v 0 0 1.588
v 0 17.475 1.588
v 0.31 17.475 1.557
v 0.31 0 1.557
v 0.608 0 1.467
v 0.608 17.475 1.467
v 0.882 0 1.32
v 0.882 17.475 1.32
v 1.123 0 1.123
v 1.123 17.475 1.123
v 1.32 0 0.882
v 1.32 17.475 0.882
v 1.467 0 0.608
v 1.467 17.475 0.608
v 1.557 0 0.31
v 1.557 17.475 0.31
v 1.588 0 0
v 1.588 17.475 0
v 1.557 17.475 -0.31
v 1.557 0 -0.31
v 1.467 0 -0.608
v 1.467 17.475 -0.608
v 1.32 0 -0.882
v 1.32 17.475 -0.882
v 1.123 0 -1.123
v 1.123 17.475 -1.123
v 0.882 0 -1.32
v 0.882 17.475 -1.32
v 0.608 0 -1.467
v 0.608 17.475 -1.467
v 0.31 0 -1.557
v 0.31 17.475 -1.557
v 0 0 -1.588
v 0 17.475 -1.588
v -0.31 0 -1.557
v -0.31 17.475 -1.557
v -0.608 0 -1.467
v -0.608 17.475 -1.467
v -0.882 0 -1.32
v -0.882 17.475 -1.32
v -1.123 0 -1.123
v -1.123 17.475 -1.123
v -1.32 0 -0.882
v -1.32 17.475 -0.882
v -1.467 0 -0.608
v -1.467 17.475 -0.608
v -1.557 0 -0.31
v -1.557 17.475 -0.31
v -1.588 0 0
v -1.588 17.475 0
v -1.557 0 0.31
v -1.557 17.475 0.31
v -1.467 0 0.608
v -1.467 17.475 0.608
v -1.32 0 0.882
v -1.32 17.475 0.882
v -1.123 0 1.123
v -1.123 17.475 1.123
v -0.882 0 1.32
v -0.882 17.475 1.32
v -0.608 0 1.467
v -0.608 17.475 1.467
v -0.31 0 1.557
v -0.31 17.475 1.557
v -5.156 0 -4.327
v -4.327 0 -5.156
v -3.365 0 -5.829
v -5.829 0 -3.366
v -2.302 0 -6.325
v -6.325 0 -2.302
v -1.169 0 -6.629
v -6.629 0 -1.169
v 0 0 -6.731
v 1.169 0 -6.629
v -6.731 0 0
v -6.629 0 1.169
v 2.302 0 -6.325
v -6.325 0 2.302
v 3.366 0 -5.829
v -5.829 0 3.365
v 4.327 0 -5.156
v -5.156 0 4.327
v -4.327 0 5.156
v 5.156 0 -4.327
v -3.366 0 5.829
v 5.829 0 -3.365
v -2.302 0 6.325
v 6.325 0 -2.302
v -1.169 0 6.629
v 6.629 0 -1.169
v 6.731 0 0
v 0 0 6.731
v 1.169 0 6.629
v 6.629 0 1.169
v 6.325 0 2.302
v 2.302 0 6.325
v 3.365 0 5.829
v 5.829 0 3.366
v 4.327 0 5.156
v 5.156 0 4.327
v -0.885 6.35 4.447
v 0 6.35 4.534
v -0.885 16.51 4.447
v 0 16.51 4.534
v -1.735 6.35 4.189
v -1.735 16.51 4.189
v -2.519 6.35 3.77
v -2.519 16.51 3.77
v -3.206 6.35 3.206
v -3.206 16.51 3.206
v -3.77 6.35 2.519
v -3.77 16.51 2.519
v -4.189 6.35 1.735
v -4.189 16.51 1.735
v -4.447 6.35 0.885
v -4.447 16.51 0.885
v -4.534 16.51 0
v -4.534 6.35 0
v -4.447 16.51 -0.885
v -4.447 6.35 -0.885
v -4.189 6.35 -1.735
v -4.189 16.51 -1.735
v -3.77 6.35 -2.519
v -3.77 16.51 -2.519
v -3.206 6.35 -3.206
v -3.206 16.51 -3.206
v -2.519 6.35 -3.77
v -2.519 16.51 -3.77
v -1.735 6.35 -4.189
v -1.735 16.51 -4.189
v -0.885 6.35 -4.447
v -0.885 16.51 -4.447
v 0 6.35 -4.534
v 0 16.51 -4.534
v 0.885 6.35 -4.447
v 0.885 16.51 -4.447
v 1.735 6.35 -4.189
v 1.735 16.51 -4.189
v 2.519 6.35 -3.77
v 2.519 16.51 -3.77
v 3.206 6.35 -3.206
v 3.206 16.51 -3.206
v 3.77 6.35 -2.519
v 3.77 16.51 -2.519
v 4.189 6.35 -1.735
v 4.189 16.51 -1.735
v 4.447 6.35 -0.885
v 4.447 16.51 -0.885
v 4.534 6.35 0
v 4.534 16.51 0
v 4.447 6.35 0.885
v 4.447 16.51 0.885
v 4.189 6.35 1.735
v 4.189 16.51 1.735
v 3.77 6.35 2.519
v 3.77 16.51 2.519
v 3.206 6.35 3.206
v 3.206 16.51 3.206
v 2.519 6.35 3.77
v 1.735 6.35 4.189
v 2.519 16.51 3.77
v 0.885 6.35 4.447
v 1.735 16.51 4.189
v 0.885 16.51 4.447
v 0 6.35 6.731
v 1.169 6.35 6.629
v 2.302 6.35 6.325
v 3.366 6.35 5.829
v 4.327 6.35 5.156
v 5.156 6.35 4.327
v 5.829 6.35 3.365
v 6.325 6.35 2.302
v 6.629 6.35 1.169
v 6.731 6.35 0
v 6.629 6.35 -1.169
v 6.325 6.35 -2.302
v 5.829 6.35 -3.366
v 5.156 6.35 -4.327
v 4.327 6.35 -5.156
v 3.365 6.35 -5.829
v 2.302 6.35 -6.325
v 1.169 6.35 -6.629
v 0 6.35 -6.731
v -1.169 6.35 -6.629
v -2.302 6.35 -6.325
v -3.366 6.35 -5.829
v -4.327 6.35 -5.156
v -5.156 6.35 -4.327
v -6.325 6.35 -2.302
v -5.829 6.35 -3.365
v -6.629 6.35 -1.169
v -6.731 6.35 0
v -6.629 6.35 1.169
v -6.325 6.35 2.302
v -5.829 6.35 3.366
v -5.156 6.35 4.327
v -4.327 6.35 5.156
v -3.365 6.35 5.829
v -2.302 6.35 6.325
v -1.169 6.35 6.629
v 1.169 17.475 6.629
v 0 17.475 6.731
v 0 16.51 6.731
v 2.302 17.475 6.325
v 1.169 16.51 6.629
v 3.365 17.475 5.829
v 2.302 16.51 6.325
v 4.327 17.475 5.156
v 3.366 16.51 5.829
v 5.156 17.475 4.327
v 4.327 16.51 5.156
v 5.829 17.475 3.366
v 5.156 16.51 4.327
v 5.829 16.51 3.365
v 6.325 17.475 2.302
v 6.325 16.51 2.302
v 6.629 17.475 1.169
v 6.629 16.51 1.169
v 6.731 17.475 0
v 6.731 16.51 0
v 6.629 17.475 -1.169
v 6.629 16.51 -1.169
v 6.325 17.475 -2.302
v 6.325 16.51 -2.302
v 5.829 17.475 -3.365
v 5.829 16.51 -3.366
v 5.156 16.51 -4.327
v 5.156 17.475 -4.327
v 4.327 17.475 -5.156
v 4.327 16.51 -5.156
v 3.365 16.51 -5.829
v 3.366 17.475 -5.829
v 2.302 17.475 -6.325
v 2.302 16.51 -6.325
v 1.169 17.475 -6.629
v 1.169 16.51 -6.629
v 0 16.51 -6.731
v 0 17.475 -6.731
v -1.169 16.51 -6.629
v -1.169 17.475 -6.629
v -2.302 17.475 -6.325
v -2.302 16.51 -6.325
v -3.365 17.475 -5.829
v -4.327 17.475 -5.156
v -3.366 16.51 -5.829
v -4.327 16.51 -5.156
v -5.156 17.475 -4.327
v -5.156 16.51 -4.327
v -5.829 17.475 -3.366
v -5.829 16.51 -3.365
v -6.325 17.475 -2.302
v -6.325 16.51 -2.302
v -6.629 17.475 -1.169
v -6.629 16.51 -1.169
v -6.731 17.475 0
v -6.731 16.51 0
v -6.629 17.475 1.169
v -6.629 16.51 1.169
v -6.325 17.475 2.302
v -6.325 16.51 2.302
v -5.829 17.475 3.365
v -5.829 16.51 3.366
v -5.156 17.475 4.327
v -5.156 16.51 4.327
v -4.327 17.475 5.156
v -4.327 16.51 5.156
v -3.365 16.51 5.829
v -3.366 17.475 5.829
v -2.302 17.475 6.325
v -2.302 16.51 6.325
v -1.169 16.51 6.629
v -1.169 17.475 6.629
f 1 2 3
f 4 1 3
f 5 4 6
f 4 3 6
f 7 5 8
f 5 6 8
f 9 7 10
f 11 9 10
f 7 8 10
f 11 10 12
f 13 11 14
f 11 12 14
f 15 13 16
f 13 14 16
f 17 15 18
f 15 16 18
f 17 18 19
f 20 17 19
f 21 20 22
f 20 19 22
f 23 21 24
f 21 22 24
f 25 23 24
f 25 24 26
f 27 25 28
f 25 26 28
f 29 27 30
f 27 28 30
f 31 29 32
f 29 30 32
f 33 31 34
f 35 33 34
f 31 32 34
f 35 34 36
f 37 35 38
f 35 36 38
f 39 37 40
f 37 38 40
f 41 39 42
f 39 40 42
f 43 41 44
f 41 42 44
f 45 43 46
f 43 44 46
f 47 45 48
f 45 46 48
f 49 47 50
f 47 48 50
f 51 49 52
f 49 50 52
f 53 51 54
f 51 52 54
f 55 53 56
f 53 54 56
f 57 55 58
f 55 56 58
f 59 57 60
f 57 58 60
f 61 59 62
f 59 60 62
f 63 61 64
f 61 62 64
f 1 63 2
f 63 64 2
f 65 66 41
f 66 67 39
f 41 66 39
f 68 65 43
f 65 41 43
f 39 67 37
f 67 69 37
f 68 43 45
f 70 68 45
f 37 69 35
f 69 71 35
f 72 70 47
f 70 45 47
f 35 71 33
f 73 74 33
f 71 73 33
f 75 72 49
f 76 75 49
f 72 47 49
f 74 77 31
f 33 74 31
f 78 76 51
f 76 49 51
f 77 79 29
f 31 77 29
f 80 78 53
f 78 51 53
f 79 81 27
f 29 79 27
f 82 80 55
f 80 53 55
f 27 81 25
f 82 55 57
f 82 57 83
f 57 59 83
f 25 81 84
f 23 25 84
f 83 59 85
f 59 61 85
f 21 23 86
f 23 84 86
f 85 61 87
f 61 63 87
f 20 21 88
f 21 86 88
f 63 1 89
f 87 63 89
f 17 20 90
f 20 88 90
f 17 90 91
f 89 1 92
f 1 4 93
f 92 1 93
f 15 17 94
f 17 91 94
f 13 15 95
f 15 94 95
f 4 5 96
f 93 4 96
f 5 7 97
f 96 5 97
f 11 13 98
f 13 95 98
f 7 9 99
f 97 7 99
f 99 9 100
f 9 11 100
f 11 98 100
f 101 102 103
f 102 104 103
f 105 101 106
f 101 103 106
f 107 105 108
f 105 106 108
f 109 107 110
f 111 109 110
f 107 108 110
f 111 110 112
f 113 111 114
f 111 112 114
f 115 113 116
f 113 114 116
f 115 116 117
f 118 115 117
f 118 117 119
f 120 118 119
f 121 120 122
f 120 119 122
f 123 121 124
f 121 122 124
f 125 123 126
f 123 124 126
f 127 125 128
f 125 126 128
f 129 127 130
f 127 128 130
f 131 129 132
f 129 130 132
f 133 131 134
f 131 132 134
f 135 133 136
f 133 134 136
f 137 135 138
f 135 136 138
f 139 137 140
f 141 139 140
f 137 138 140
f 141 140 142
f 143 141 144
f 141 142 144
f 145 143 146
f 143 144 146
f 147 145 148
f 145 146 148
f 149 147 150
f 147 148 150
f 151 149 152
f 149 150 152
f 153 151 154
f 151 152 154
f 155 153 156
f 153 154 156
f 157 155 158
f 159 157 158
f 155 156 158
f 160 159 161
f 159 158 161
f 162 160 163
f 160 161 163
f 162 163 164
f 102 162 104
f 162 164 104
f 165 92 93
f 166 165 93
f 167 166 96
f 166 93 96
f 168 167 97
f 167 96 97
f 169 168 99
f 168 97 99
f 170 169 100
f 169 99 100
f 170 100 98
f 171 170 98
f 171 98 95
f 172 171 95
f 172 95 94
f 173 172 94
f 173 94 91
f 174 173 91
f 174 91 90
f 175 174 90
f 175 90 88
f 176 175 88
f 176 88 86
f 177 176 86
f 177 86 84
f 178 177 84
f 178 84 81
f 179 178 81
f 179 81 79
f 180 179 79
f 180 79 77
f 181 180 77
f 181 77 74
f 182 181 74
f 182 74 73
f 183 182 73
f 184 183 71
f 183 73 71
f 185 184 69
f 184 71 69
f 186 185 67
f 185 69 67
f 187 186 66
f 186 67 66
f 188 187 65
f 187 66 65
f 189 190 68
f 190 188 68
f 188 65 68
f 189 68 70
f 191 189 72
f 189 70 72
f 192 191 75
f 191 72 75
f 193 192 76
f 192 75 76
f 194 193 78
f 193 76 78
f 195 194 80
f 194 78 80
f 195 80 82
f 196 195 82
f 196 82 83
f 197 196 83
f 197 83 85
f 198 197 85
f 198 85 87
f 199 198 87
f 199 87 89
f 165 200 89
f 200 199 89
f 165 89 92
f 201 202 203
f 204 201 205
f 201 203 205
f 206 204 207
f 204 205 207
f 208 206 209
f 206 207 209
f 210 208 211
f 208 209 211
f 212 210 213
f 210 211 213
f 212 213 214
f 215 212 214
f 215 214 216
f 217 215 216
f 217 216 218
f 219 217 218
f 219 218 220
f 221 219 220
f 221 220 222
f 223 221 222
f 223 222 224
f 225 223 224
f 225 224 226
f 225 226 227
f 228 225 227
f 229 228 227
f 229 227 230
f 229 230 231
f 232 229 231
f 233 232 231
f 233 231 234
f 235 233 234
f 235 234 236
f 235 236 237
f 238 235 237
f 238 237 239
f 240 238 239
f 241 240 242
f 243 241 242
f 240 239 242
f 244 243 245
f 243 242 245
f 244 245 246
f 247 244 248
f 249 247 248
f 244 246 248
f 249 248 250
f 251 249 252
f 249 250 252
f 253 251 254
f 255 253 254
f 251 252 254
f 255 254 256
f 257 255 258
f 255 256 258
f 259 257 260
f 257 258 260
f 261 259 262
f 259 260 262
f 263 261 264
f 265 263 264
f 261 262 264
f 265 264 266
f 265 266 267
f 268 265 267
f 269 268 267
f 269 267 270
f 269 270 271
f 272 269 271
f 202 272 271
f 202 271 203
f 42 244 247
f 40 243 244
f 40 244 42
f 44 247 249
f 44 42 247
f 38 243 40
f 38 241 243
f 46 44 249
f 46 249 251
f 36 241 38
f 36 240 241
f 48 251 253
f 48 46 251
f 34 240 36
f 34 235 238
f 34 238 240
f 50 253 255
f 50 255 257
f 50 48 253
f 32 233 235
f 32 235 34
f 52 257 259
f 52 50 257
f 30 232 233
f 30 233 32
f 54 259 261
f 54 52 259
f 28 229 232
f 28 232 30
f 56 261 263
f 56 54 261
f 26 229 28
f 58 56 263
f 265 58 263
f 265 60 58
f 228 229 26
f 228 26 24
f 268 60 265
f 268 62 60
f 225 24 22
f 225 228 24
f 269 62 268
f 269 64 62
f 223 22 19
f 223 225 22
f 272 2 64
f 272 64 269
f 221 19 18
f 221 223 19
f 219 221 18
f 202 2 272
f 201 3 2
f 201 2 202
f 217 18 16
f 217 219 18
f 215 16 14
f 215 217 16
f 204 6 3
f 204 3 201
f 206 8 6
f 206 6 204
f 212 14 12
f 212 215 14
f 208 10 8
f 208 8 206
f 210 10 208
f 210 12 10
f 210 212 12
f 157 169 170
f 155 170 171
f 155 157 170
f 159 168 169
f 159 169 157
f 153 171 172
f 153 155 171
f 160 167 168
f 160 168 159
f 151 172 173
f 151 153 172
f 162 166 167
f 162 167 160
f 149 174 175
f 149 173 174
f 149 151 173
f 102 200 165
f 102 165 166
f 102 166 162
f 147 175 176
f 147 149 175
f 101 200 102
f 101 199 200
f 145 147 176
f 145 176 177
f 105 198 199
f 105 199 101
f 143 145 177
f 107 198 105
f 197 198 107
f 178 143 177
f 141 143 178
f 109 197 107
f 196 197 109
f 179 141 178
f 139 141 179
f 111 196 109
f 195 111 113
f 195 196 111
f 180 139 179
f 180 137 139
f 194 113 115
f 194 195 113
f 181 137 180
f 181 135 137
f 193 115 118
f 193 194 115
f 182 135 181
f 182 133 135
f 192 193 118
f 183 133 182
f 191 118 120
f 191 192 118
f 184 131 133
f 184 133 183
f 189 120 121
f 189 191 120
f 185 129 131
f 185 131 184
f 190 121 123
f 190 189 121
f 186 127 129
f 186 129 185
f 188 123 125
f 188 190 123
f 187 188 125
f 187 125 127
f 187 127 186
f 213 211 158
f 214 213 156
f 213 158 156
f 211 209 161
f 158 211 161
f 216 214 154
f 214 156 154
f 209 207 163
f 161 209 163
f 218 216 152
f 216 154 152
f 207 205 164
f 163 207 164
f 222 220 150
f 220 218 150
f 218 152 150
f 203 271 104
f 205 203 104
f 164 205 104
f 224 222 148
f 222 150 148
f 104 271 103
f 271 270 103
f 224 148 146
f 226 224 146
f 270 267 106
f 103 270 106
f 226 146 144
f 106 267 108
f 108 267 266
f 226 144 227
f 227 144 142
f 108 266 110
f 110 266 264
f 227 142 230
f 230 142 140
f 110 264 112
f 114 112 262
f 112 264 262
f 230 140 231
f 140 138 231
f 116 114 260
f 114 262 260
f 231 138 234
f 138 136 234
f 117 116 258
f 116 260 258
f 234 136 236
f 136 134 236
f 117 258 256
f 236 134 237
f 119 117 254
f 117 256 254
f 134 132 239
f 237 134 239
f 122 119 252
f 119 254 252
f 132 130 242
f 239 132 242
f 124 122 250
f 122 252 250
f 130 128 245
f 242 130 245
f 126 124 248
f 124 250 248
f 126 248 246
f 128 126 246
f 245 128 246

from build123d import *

# Parameters (mm, degrees)
SKETCH1_R           = 6.731
BOSS_EXTRUDE1_DEPTH = 17.4752
SKETCH2_W           = 2.1971
SKETCH2_H           = 10.16
SKETCH3_R           = 1.5875
CUT_EXTRUDE1_DEPTH  = 17.4752


with BuildPart() as part:
    # Sketch1 → Boss-Extrude1 (new body)
    with BuildSketch(Plane(origin=(0, 0, 0), x_dir=(1, 0, 0), z_dir=(0, 1, 0))):
        with Locations(Location((0, 0, 0), (0, 0, 270))):
            Circle(SKETCH1_R)
    extrude(amount=BOSS_EXTRUDE1_DEPTH)

    # Sketch2 → Cut-Revolve1 (revolve, cut)
    with BuildSketch(Plane(origin=(0, 0, 0), x_dir=(0, 0, -1), z_dir=(1, 0, 0)), mode=Mode.PRIVATE) as cut_revolve1_sk:
        with Locations((5.63245, 11.43)):
            Rectangle(SKETCH2_W, SKETCH2_H)
    revolve(cut_revolve1_sk.sketch.rotate(Axis((0, 18.309331677, 0), (0, -1, 0)), 180), axis=Axis((0, 18.309331677, 0), (0, -1, 0)), mode=Mode.SUBTRACT)

    # Sketch3 → Cut-Extrude1 (cut)
    with BuildSketch(Plane(origin=(0, 17.4752, 0), x_dir=(1, 0, 0), z_dir=(0, 1, 0))):
        with Locations(Location((0, 0, 0), (0, 0, 270))):
            Circle(SKETCH3_R)
    extrude(amount=-CUT_EXTRUDE1_DEPTH, mode=Mode.SUBTRACT)


solid = part.part
